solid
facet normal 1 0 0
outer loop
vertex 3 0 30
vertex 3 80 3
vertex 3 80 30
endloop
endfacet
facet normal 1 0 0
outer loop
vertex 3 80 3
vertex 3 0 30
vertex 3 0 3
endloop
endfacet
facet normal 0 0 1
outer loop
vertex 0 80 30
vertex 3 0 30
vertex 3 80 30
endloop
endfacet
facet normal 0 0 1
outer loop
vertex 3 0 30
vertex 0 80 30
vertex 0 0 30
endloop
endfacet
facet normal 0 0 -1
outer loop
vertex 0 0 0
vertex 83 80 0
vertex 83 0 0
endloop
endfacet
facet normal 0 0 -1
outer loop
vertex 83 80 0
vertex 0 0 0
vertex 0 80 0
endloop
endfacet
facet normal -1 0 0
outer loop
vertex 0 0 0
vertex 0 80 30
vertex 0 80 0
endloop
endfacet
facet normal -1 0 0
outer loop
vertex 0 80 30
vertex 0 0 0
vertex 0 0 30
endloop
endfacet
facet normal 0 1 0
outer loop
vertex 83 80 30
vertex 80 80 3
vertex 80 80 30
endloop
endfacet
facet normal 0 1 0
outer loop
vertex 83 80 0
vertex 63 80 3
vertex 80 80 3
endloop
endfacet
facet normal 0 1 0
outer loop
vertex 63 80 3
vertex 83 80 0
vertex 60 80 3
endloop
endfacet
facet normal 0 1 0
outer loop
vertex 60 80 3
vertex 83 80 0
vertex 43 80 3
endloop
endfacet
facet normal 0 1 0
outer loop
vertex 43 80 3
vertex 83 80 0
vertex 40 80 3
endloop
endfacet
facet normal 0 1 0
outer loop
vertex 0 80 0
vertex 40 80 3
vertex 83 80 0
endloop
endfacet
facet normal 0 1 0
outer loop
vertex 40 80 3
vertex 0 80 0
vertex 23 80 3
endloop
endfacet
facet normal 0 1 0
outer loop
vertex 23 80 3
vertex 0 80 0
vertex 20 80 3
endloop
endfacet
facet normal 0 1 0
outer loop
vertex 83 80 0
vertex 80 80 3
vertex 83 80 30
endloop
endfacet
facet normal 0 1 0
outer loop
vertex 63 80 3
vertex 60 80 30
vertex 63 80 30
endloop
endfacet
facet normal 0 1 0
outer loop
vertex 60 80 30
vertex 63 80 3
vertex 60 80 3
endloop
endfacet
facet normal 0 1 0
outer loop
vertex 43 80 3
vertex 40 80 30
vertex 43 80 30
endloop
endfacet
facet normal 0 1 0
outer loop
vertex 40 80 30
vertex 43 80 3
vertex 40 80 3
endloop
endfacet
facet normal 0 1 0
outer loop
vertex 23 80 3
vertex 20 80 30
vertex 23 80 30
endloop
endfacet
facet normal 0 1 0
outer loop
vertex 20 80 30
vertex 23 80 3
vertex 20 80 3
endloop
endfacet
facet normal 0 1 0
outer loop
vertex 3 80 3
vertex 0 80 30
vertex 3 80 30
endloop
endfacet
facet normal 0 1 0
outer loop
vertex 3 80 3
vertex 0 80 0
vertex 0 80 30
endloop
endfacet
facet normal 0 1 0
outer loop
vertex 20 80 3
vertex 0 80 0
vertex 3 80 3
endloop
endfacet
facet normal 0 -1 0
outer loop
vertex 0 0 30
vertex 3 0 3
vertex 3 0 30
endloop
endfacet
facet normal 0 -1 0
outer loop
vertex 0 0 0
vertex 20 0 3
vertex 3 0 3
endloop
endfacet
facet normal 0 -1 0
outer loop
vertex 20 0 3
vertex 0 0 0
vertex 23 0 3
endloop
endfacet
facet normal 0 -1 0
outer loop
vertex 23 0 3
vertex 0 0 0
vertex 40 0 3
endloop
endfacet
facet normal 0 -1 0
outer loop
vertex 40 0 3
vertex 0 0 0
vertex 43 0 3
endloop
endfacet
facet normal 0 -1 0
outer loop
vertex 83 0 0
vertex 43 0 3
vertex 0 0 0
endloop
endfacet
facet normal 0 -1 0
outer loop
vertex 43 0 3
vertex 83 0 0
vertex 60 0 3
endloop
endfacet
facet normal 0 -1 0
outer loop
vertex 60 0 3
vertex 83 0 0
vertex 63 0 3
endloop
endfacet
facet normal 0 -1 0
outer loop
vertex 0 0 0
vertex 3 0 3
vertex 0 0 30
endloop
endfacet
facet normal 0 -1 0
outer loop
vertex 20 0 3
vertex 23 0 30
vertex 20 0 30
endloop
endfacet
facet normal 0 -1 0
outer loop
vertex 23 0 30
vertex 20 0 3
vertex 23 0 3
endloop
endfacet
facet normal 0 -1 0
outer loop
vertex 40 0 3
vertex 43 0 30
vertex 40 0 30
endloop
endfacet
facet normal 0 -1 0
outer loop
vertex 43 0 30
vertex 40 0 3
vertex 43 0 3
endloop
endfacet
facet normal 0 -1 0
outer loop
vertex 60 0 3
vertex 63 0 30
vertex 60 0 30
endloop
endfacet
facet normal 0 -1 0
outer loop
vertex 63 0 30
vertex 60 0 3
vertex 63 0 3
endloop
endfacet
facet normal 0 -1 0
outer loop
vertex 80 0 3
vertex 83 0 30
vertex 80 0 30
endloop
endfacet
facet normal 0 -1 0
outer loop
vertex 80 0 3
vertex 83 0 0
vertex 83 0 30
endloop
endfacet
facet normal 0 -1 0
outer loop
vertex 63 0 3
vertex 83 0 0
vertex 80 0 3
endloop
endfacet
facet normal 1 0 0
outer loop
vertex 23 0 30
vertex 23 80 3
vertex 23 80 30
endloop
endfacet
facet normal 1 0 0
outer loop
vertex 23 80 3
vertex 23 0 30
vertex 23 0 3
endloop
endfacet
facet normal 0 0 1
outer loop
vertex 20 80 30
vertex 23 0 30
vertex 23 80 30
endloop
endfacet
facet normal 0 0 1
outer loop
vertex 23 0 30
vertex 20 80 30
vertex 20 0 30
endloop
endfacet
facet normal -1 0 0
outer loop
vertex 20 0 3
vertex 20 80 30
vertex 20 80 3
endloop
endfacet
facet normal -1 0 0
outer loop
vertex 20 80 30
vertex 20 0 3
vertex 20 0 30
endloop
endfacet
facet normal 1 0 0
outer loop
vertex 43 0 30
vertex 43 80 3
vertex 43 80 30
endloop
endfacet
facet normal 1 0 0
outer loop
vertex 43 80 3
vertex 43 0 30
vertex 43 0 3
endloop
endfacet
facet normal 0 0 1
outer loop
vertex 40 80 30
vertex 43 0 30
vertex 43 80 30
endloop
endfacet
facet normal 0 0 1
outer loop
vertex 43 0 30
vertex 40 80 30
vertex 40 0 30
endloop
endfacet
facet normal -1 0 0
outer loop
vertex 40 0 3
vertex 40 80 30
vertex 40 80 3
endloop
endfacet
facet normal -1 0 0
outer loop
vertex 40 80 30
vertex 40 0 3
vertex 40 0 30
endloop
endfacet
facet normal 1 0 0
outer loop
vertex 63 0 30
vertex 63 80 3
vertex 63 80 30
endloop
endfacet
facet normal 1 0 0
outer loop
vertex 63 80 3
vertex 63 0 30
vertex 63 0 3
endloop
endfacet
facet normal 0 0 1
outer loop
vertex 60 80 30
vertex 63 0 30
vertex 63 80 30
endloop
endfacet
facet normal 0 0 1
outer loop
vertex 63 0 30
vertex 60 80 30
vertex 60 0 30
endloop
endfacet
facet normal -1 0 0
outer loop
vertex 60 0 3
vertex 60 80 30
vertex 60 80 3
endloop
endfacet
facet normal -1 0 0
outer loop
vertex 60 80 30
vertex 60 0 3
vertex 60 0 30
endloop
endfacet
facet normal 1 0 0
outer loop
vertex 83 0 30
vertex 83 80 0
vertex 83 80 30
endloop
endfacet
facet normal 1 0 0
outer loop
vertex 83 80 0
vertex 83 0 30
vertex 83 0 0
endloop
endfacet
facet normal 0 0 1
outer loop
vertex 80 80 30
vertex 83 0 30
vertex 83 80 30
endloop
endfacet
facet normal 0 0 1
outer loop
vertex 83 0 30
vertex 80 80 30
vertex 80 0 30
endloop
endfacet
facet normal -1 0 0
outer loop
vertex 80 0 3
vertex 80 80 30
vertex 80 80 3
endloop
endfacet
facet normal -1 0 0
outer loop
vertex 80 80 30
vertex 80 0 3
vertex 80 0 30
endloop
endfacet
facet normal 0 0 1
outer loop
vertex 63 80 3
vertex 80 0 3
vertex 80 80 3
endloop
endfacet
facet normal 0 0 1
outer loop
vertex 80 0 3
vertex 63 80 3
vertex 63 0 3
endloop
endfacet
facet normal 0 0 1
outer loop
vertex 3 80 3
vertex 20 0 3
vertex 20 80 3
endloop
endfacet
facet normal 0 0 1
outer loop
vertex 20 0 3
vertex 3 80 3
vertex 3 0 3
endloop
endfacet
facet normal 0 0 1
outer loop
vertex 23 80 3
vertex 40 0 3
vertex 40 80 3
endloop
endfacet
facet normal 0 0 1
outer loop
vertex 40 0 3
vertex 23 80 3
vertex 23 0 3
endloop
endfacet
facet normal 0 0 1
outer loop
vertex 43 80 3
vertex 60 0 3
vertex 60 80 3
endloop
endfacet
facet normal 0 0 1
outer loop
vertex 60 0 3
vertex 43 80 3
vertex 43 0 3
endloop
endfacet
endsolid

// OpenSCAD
echo(version=version());
$fn=60;

baseH = 3;
baseL = 80;
baseW = 80;
sepH = 30;
sepM = 20;

// base
cube([baseL,baseW,baseH]);
// separater
for (x = [0 : sepM : baseL])
{
    translate([x, 0, 0]) sep();
}

module sep() {
    cube([baseH,baseW,sepH]);
}
